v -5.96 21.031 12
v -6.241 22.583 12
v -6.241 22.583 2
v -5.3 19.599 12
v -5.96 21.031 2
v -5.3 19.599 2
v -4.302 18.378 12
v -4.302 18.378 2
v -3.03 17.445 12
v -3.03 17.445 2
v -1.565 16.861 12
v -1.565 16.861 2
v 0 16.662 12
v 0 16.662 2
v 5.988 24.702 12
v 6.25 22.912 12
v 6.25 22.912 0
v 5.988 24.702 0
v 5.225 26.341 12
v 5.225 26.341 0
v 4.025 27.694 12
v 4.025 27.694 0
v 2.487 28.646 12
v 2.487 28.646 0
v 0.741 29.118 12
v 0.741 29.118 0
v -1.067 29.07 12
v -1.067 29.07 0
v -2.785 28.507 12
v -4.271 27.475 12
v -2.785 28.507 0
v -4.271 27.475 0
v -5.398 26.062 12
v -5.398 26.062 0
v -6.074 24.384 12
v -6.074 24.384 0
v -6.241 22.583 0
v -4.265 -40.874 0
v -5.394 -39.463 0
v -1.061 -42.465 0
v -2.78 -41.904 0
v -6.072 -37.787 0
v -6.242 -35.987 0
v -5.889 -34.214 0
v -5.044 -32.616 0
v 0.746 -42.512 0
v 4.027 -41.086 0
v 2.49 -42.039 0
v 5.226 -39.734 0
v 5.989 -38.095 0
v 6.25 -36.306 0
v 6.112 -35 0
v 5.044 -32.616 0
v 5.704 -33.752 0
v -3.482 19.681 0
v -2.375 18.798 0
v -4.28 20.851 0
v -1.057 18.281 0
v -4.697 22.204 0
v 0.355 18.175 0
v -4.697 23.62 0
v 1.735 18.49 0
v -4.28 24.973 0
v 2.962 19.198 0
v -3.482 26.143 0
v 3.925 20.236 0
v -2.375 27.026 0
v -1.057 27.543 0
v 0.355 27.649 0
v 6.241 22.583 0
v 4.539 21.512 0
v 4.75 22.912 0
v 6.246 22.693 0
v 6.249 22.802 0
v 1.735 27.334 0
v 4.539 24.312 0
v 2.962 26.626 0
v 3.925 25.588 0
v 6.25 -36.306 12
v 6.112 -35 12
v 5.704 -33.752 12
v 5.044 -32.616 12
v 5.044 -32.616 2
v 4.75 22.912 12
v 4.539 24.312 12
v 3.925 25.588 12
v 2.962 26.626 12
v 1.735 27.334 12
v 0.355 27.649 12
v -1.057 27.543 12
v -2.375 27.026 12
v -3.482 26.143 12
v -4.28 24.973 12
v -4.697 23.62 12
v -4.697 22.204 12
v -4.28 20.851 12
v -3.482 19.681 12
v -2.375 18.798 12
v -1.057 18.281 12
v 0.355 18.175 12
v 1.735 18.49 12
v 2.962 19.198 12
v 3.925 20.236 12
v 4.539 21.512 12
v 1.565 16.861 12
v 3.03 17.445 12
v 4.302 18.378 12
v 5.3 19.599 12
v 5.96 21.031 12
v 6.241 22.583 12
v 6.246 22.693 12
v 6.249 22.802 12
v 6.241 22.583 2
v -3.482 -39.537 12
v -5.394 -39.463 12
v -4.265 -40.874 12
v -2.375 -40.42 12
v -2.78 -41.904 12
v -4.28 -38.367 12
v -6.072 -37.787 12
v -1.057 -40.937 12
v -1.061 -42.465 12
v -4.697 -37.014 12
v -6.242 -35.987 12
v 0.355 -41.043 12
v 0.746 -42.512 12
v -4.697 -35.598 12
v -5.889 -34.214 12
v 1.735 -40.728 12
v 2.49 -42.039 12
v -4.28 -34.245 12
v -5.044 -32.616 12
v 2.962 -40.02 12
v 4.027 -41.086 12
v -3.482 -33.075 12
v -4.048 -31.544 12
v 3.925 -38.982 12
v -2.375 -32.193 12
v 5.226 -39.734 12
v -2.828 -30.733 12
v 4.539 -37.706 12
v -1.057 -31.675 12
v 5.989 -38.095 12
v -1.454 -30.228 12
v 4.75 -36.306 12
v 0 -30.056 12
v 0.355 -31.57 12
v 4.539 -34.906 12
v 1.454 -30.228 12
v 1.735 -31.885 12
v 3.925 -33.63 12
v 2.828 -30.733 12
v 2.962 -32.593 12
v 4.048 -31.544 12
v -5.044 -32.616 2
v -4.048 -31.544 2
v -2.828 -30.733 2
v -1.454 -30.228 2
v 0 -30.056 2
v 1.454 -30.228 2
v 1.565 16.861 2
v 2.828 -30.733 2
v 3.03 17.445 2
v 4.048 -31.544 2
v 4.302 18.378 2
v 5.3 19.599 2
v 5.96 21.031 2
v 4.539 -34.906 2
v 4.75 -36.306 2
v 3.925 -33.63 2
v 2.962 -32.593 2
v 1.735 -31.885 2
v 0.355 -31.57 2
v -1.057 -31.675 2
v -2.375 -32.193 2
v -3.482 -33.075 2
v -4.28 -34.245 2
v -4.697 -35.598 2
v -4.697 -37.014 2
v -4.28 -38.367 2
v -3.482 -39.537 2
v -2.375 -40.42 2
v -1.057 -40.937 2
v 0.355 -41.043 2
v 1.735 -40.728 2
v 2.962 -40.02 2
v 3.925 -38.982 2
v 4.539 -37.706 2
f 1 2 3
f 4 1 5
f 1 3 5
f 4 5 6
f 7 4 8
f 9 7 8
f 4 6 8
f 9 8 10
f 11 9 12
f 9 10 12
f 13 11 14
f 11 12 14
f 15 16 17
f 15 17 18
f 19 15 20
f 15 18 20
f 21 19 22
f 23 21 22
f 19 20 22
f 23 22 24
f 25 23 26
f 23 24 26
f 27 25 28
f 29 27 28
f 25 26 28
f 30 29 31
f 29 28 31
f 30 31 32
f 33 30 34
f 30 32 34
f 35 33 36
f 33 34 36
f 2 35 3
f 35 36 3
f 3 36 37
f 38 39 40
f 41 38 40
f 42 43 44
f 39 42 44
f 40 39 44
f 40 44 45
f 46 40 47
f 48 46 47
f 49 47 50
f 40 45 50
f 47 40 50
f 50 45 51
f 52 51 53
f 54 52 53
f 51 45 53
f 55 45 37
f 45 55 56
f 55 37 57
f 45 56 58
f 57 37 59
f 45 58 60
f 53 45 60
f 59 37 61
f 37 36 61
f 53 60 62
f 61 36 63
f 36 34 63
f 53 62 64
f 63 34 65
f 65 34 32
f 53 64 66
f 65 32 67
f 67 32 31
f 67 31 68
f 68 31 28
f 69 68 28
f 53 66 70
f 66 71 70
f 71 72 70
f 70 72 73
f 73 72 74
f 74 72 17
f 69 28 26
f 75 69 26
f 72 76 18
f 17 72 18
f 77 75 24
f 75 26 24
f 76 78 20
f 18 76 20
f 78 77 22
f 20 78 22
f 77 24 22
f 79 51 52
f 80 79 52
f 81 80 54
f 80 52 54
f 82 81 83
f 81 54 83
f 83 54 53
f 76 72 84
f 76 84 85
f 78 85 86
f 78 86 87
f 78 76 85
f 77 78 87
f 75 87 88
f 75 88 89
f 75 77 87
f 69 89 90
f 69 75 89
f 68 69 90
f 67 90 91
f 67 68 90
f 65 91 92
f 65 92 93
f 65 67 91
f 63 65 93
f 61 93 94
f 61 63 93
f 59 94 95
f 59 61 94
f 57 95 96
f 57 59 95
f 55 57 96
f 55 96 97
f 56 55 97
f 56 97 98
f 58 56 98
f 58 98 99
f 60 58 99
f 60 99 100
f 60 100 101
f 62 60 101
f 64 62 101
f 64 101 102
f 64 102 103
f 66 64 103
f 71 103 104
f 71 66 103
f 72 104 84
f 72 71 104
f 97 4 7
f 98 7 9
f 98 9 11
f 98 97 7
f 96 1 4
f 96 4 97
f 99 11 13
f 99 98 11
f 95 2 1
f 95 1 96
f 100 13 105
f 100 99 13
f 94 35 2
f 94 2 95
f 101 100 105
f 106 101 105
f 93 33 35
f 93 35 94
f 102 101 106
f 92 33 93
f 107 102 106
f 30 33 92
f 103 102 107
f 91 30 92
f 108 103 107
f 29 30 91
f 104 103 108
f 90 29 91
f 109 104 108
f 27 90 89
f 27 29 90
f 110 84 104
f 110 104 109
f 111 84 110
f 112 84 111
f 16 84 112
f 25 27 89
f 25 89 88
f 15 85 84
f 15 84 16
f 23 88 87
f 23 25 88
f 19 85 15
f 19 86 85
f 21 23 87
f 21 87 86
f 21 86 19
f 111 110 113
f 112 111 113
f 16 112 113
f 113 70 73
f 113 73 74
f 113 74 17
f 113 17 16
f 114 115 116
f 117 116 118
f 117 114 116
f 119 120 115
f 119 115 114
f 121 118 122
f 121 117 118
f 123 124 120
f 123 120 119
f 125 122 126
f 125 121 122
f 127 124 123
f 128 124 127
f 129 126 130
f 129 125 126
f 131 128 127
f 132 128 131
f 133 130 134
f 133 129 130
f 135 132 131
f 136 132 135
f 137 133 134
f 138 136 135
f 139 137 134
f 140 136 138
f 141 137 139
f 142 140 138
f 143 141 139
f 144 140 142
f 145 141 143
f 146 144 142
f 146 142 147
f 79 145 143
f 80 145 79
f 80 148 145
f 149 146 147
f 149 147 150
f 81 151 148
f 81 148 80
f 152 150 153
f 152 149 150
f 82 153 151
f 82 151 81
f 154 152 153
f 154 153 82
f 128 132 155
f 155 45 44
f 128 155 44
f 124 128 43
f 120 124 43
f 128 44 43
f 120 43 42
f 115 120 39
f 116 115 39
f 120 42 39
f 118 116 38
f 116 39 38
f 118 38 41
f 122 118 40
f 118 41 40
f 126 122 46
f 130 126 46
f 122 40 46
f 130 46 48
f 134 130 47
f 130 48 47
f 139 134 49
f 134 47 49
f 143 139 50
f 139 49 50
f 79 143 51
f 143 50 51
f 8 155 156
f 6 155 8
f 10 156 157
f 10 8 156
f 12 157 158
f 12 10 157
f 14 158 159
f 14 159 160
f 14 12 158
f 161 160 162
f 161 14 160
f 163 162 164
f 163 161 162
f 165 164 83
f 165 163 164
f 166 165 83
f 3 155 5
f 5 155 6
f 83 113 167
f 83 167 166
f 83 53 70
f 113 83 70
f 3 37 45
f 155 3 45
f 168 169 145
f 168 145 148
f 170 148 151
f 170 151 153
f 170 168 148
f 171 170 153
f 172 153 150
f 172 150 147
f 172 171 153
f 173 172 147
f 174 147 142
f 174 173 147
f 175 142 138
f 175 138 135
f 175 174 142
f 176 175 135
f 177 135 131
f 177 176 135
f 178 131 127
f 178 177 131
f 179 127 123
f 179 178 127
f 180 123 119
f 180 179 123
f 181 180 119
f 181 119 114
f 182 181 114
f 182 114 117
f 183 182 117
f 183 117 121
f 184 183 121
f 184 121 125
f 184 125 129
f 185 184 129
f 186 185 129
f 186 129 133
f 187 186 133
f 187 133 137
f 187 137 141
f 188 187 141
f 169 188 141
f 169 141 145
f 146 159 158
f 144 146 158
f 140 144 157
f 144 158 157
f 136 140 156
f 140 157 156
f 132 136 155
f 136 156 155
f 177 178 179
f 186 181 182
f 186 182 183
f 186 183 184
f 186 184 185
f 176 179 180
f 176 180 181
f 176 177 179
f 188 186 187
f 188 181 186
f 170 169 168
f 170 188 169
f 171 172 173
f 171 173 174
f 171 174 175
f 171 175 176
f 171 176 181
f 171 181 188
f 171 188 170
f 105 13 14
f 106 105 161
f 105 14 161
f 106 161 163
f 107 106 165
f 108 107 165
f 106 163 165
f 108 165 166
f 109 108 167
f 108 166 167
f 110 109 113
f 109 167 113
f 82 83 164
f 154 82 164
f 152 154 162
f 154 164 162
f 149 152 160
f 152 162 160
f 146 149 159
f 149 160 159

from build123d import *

# Parameters (mm, degrees)
F1_DEPTH = 2
F0_R     = 4.75
F2_DEPTH = 12


with BuildPart() as f1:
    # F0 (on Top) → F1 (new body)
    with BuildSketch(Plane.XY):
        with BuildLine():
            Line((-6.2413531605, 22.5833728044), (-5.0444387575, -32.6162494679))
            ThreePointArc((-5.0444387575, -32.6162494679), (-2.8284243086, -30.7328789341), (0, -30.0562545657))
            Line((0, -30.0562545657), (0, 16.6620226577))
            ThreePointArc((0, 16.6620226577), (-4.3016530786, 18.3778986197), (-6.2413531605, 22.5833728044))
        make_face()
        with BuildLine():
            ThreePointArc((0, -30.0562545657), (2.8284243086, -30.7328789341), (5.0444387575, -32.6162494679))
            Line((5.0444387575, -32.6162494679), (6.2413531605, 22.5833728044))
            ThreePointArc((6.2413531605, 22.5833728044), (4.3016530786, 18.3778986197), (0, 16.6620226577))
            Line((0, 16.6620226577), (0, -30.0562545657))
        make_face()
    extrude(amount=F1_DEPTH)



with BuildPart() as f1b:
    # F0 (on Top) → F1, piece 2 (new body)
    with BuildSketch(Plane.XY):
        with Locations((0, -36.3062545657)):
            Circle(F0_R)
    extrude(amount=F1_DEPTH)


with BuildPart() as f1_1:
    add(f1.part)

    add(f1b.part)  # F2 merges F1b
    # F0 (on Top) → F2 (join)
    with BuildSketch(Plane.XY):
        with BuildLine():
            ThreePointArc((0, 16.6620226577), (4.3016530786, 18.3778986197), (6.2413531605, 22.5833728044))
            ThreePointArc((6.2413531605, 22.5833728044), (6.2478379162, 22.7476408659), (6.25, 22.9120226577))
            ThreePointArc((6.25, 22.9120226577), (-0.1643817918, 29.1598605738), (-6.2413531605, 22.5833728044))
            ThreePointArc((-6.2413531605, 22.5833728044), (-4.3016530786, 18.3778986197), (0, 16.6620226577))
        make_face()
        with Locations((0, 22.9120226577)):
            Circle(F0_R, mode=Mode.SUBTRACT)
        with BuildLine():
            ThreePointArc((-5.0444387575, -32.6162494679), (-1.9409736945, -42.2472242776), (6.25, -36.3062545657))
            ThreePointArc((6.25, -36.3062545657), (5.9409697119, -34.3652808712), (5.0444387575, -32.6162494679))
            ThreePointArc((5.0444387575, -32.6162494679), (2.8284243086, -30.7328789341), (0, -30.0562545657))
            ThreePointArc((0, -30.0562545657), (-2.8284243086, -30.7328789341), (-5.0444387575, -32.6162494679))
        make_face()
        with Locations((0, -36.3062545657)):
            Circle(F0_R, mode=Mode.SUBTRACT)
    extrude(amount=F2_DEPTH)


solid = f1_1.part
